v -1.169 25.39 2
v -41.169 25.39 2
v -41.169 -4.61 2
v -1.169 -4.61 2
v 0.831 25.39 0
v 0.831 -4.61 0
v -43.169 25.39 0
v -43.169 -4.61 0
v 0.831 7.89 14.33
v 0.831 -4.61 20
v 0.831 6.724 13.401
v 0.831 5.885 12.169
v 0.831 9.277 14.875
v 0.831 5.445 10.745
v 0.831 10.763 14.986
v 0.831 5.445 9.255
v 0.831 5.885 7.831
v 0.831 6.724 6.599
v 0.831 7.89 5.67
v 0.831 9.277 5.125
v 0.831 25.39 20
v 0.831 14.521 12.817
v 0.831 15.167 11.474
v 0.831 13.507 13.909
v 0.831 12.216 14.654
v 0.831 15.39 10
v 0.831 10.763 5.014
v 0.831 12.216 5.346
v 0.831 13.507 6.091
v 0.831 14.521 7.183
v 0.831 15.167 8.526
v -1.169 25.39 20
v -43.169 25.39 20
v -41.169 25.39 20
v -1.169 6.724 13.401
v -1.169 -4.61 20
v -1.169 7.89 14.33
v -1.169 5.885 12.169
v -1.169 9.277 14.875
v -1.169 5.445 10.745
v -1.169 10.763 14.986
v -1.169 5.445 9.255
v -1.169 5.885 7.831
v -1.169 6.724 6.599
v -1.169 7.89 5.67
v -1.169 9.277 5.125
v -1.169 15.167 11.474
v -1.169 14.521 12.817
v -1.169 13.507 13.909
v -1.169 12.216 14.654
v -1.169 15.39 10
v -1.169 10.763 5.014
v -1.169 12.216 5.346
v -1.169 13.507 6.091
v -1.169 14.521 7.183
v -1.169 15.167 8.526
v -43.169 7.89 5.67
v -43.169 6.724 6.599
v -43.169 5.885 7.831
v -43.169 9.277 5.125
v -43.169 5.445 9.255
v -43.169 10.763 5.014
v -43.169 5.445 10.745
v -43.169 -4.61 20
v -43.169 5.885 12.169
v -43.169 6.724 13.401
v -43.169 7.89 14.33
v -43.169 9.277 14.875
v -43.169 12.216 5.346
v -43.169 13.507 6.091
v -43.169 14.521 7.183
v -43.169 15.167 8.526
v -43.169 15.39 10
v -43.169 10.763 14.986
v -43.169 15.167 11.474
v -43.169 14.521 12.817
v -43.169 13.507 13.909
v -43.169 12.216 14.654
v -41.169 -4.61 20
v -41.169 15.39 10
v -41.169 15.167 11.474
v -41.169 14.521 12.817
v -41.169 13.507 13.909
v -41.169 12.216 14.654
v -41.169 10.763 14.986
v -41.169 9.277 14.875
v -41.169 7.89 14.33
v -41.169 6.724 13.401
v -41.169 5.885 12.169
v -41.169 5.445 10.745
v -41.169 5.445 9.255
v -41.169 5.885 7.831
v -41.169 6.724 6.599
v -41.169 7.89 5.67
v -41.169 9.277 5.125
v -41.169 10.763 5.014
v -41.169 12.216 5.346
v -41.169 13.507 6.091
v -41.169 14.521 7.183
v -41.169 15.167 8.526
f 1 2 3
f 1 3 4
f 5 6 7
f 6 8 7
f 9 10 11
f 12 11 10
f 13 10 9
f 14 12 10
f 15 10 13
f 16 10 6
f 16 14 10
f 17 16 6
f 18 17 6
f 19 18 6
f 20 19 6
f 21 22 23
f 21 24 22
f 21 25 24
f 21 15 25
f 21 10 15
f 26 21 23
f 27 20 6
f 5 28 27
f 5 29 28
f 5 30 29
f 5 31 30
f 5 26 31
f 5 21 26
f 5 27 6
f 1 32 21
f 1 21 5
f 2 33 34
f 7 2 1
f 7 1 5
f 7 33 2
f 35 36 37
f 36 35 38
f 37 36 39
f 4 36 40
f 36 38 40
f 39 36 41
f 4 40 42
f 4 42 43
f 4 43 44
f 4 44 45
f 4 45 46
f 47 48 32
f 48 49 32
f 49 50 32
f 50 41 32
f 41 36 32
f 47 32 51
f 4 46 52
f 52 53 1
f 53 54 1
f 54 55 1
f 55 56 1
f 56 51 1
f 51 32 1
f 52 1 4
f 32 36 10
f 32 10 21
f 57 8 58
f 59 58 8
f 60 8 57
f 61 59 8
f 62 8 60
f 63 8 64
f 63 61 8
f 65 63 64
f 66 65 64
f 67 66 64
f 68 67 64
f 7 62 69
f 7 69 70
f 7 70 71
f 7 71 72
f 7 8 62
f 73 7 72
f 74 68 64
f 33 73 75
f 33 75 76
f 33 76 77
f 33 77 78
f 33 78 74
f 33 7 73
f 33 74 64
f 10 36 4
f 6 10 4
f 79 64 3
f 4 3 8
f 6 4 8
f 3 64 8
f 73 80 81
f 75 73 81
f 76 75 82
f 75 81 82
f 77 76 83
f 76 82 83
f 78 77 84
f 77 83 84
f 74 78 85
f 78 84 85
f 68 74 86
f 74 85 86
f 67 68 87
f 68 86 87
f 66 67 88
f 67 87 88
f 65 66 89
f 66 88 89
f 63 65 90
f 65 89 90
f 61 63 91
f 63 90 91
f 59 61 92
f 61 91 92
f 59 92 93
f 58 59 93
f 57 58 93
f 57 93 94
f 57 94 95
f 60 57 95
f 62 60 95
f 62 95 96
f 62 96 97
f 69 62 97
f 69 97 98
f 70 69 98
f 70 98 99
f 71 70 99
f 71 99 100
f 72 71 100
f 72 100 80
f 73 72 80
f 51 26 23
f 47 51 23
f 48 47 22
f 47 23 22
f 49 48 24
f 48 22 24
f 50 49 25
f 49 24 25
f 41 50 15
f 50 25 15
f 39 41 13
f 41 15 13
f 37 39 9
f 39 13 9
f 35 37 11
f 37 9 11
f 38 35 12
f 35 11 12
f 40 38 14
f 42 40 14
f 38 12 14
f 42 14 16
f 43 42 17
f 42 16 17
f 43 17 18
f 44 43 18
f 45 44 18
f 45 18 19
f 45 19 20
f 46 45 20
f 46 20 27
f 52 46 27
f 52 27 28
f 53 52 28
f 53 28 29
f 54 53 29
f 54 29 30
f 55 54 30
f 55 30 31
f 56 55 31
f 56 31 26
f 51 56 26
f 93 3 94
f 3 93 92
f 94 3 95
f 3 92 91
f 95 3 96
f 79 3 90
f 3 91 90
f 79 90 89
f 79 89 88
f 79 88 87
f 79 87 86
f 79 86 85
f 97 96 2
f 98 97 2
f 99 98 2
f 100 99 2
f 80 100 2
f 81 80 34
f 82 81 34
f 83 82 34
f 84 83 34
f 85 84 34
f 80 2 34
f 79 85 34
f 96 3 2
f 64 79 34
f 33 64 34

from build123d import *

# Parameters (mm, degrees)
SKETCH1_W           = 40
SKETCH1_H           = 30
BOSS_EXTRUDE1_DEPTH = 2
SKETCH2_W           = 20
SKETCH2_H           = 30
BOSS_EXTRUDE2_DEPTH = 2
SKETCH3_W           = 20
SKETCH3_H           = 30
BOSS_EXTRUDE3_DEPTH = 2
SKETCH5_R           = 5
CUT_EXTRUDE2_DEPTH  = 55.595167513


with BuildPart() as part:
    # Sketch1 → Boss-Extrude1 (new body)
    with BuildSketch(Plane.XY):
        with Locations((-21.168831169, 10.38961039)):
            Rectangle(SKETCH1_W, SKETCH1_H)
    extrude(amount=BOSS_EXTRUDE1_DEPTH)

    # Sketch2 → Boss-Extrude2 (add)
    with BuildSketch(Plane.ZY.offset(41.168831169)):
        with Locations((10, 10.38961039)):
            Rectangle(SKETCH2_W, SKETCH2_H)
    extrude(amount=BOSS_EXTRUDE2_DEPTH)

    # Sketch3 → Boss-Extrude3 (add)
    with BuildSketch(Plane(origin=(-1.168831169, 0, 0), x_dir=(0, 0, -1), z_dir=(1, 0, 0))):
        with Locations((-10, 10.38961039)):
            Rectangle(SKETCH3_W, SKETCH3_H)
    extrude(amount=BOSS_EXTRUDE3_DEPTH)

    # Sketch5 → Cut-Extrude2 (cut, through all)
    with BuildSketch(Plane(origin=(0.831168831, 0, 0), x_dir=(0, 0, -1), z_dir=(1, 0, 0))):
        with Locations(Location((-10, 10.38961039, 0), (0, 0, 90))):
            Circle(SKETCH5_R)
    extrude(amount=-CUT_EXTRUDE2_DEPTH, mode=Mode.SUBTRACT)


solid = part.part
